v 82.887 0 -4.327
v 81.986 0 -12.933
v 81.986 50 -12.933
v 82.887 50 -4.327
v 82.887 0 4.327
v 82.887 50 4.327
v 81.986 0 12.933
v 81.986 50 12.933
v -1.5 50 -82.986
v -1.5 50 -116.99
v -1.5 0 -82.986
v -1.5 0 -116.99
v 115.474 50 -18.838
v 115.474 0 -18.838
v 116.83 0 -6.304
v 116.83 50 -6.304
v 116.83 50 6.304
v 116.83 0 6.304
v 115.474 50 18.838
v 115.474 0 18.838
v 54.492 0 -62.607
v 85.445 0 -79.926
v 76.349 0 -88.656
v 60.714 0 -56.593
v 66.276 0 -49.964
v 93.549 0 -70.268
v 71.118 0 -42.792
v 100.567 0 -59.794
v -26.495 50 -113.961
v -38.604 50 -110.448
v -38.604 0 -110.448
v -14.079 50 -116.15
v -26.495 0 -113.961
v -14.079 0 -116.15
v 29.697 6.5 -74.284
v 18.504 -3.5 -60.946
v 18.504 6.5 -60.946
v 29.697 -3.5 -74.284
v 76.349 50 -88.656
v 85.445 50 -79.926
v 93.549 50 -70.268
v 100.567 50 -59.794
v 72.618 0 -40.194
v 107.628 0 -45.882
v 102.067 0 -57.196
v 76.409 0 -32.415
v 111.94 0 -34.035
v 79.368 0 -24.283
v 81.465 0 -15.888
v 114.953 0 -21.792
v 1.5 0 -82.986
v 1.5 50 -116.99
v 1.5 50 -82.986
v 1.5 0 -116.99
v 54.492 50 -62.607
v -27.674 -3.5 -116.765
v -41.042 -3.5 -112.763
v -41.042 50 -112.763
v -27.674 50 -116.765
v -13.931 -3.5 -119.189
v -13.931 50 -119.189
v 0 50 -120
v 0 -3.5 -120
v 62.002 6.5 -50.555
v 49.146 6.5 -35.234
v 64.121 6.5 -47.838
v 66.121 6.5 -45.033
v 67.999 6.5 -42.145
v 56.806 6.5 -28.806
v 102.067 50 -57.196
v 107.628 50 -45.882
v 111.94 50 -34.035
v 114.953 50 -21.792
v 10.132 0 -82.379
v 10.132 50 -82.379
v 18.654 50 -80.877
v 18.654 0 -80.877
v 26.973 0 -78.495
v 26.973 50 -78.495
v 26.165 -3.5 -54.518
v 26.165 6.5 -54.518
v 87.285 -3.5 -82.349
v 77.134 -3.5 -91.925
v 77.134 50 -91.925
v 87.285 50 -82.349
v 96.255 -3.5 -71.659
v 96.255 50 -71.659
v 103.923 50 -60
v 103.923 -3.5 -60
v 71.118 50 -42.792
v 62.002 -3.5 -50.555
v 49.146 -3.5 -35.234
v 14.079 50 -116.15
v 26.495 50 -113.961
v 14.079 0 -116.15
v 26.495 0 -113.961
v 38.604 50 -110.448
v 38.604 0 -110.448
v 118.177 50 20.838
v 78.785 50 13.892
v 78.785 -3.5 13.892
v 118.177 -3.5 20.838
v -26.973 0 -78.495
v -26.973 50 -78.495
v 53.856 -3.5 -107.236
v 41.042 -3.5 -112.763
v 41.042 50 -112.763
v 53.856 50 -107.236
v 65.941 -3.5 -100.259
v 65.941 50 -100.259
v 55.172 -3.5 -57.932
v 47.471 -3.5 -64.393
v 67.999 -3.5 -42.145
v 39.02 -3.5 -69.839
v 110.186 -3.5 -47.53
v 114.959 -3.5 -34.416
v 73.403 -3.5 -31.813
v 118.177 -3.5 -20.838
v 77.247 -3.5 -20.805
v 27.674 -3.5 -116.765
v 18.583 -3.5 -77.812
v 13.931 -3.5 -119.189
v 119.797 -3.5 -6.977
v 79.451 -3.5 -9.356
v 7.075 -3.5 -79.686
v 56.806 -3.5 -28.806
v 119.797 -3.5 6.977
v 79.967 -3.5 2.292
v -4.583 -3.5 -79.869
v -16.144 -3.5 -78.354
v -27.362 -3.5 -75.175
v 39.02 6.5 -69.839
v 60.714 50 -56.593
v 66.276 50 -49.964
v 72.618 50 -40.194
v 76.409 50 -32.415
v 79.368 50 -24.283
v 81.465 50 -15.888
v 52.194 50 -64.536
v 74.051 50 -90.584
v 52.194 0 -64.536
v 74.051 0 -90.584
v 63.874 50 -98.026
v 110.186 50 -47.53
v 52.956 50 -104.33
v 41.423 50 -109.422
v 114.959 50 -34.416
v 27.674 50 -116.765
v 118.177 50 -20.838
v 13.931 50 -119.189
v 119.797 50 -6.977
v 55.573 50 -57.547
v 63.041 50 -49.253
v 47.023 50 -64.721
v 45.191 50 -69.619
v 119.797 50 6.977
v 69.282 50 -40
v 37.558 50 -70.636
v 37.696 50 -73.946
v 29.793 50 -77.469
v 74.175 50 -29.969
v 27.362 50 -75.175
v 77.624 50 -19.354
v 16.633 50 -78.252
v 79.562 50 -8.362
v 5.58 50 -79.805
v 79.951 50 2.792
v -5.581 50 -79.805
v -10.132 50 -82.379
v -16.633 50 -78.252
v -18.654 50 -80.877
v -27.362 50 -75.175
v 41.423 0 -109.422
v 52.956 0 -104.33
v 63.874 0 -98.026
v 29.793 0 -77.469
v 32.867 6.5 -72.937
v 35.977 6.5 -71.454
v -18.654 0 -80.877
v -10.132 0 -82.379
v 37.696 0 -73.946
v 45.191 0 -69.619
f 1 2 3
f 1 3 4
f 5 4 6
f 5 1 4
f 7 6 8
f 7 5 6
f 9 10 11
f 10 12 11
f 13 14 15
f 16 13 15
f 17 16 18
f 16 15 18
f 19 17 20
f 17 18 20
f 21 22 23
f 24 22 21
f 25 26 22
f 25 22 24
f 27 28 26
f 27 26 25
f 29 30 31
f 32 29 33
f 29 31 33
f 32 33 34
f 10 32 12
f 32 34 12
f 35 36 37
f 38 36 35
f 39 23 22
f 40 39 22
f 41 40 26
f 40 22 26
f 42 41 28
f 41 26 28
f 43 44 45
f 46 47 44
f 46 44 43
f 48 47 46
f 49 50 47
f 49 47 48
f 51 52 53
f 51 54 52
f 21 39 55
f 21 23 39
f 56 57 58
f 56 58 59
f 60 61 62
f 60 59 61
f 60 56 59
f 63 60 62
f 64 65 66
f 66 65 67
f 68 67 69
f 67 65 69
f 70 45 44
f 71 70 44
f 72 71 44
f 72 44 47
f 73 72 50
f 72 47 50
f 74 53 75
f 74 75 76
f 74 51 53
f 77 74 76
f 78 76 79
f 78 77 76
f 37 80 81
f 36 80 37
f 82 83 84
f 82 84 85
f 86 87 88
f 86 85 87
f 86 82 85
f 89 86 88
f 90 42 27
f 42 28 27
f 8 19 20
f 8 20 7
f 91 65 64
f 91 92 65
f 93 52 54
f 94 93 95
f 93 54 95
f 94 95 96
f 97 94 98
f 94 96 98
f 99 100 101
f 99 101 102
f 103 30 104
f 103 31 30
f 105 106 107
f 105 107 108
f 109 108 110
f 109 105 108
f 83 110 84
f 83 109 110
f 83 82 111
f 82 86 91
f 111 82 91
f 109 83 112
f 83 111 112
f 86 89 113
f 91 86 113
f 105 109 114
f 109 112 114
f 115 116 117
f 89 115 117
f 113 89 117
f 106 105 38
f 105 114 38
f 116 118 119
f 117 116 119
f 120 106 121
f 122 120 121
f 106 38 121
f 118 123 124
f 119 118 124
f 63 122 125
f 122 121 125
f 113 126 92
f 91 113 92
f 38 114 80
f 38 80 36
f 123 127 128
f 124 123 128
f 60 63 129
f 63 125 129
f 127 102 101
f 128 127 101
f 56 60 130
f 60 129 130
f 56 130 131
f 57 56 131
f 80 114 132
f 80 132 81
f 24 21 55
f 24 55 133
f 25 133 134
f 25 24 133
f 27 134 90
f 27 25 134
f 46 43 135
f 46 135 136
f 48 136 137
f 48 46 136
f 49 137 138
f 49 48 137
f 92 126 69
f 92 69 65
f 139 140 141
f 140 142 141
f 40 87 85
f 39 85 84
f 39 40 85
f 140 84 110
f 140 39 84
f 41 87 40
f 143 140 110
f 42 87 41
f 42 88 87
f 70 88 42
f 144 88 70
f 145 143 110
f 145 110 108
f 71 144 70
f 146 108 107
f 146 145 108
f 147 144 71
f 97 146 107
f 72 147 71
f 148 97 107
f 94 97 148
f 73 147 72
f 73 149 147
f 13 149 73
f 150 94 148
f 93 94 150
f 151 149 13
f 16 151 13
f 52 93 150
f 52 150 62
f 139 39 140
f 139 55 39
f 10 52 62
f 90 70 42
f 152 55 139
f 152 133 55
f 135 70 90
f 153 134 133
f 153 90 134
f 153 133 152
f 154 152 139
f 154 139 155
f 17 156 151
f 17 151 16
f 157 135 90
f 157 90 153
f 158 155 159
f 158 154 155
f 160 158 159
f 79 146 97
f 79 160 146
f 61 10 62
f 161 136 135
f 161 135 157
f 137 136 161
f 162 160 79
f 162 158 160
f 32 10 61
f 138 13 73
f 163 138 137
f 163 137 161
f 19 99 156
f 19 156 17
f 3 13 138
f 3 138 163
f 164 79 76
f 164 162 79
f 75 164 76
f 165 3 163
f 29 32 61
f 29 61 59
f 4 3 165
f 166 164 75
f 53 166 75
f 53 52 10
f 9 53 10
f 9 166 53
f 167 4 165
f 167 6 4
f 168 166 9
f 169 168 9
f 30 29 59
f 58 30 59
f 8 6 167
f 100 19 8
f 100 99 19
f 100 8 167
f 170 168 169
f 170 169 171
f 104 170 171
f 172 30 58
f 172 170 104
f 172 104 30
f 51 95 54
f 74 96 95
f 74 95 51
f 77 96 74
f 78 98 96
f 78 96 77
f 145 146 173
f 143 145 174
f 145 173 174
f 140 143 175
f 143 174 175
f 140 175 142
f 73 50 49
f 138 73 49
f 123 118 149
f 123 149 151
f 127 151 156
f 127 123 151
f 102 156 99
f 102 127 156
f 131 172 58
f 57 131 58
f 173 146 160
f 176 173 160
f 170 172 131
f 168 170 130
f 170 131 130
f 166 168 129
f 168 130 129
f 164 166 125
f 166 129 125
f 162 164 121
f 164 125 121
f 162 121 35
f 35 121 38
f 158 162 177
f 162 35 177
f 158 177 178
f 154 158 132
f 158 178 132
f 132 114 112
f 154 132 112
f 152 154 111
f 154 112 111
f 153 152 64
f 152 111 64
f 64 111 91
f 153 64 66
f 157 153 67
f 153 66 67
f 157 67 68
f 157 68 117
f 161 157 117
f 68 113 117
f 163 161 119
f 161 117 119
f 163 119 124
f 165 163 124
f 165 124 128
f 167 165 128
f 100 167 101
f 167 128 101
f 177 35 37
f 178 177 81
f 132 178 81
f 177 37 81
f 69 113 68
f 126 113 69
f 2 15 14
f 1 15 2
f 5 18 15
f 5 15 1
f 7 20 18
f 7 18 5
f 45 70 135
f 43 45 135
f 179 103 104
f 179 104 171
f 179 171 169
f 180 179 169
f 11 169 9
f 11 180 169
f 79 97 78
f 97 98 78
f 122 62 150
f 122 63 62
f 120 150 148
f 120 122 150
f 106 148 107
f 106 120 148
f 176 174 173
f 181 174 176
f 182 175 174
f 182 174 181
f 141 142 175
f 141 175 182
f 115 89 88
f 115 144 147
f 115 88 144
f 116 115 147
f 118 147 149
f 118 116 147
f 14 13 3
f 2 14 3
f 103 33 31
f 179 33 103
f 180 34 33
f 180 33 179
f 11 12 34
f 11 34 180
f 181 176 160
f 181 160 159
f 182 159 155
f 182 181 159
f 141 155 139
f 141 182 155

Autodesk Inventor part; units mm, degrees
ref_plane "YZ Plane" through (0, 0, 0) normal (1, 0, 0) x (0, 1, 0)
ref_plane "XZ Plane" through (0, 0, 0) normal (0, 1, 0) x (-1, 0, 0)
sketch "Esquisse1" plane through (0, 0, 0) normal (0, 1, 0) x (-1, 0, 0)
  circle A0 centre (0, 0) radius 100
  line L0 (0, 0) -> (-118.1769, 20.8378)
  line L1 (0, 0) -> (-2.1593, 0)
  line L2 (0, 0) -> (-118.1769, -20.8378)
  arc A1 (-118.1769, 20.8378) -> (-118.1769, -20.8378) centre (0, 0) ccw
  line L3 (-118.1769, 20.8378) -> (-78.7846, 13.8919)
  arc A2 (-78.7846, 13.8919) -> (-78.7846, -13.8919) centre (0, 0) ccw
  line L4 (-78.7846, -13.8919) -> (-118.1769, -20.8378)
  arc A3 (-115.2225, 20.3168) -> (-115.2225, -20.3168) centre (0, 0) ccw
  arc A4 (-81.739, 14.4128) -> (-81.739, -14.4128) centre (0, 0) ccw
  line L5 (-115.4735, 18.838) -> (-81.9862, 12.9332)
  line L6 (-115.4735, -18.838) -> (-81.9862, -12.9332)
  dimension "d0" = 200
  dimension "d1" = 10
  dimension "d2" = 10
  dimension "d3" = 40
  dimension "d4" = 120
  dimension "d5" = 117
  dimension "d6" = 83
  dimension "d7" = 1.5
  dimension "d8" = 1.5
extrude "Extrusion2" add sketch "Esquisse1" along normal blind 50 and the other way blind 3.5 contours L0 A4 L5 A0 | A0 L5 A3 L0 | L2 A3 L6 A0 | A0 L6 A4 L2 | L5 A4 L6 A0 | A0 L6 A3 L5 | L0 A2 L2 A4 | A3 L2 A1 L0
extrude "Extrusion3" cut sketch "Esquisse1" along normal blind 60 contours L5 A4 L6 A0 | A0 L6 A3 L5
pattern_circular "Réseau circulaire1" count 6 over 100 about axis through (0, -10, 0) along (0, 1, 0) of "Extrusion2", "Extrusion3"
sketch "Esquisse2" plane through (0, -3.5, 0) normal (0, -1, 0) x (1, 0, 0)
  line L0 (0, 0) -> (51.423, -61.2836)
  arc A0 (-27.3616, -75.1754) -> (78.7846, 13.8919) centre (0, 0) ccw projected
  line L1 (0, 0) -> (78.7846, 13.8919)
  line L2 (62.0017, -50.5549) -> (69.6621, -44.127)
  line L3 (69.6621, -44.127) -> (56.8064, -28.8061)
  line L4 (56.8064, -28.8061) -> (49.1459, -35.234)
  line L5 (49.1459, -35.234) -> (62.0017, -50.5549)
  dimension "d20" = 60
  dimension "d21" = 10
  dimension "d22" = 15
  dimension "d23" = 20
extrude "Extrusion4" add sketch "Esquisse2" against normal blind 10 contours L5 L4 L3 A0 | A0 L3 L2
ref_plane "Plan de construction1" through (0, 0, 0) normal (0.766, 0, 0.6428) x (0.6422, -0.0437, -0.7653)
mirror "Symétrie1" about plane through (0, 0, 0) normal (0.766, 0, 0.6428) of "Extrusion4"
properties part number "bacRecupBonbon"
